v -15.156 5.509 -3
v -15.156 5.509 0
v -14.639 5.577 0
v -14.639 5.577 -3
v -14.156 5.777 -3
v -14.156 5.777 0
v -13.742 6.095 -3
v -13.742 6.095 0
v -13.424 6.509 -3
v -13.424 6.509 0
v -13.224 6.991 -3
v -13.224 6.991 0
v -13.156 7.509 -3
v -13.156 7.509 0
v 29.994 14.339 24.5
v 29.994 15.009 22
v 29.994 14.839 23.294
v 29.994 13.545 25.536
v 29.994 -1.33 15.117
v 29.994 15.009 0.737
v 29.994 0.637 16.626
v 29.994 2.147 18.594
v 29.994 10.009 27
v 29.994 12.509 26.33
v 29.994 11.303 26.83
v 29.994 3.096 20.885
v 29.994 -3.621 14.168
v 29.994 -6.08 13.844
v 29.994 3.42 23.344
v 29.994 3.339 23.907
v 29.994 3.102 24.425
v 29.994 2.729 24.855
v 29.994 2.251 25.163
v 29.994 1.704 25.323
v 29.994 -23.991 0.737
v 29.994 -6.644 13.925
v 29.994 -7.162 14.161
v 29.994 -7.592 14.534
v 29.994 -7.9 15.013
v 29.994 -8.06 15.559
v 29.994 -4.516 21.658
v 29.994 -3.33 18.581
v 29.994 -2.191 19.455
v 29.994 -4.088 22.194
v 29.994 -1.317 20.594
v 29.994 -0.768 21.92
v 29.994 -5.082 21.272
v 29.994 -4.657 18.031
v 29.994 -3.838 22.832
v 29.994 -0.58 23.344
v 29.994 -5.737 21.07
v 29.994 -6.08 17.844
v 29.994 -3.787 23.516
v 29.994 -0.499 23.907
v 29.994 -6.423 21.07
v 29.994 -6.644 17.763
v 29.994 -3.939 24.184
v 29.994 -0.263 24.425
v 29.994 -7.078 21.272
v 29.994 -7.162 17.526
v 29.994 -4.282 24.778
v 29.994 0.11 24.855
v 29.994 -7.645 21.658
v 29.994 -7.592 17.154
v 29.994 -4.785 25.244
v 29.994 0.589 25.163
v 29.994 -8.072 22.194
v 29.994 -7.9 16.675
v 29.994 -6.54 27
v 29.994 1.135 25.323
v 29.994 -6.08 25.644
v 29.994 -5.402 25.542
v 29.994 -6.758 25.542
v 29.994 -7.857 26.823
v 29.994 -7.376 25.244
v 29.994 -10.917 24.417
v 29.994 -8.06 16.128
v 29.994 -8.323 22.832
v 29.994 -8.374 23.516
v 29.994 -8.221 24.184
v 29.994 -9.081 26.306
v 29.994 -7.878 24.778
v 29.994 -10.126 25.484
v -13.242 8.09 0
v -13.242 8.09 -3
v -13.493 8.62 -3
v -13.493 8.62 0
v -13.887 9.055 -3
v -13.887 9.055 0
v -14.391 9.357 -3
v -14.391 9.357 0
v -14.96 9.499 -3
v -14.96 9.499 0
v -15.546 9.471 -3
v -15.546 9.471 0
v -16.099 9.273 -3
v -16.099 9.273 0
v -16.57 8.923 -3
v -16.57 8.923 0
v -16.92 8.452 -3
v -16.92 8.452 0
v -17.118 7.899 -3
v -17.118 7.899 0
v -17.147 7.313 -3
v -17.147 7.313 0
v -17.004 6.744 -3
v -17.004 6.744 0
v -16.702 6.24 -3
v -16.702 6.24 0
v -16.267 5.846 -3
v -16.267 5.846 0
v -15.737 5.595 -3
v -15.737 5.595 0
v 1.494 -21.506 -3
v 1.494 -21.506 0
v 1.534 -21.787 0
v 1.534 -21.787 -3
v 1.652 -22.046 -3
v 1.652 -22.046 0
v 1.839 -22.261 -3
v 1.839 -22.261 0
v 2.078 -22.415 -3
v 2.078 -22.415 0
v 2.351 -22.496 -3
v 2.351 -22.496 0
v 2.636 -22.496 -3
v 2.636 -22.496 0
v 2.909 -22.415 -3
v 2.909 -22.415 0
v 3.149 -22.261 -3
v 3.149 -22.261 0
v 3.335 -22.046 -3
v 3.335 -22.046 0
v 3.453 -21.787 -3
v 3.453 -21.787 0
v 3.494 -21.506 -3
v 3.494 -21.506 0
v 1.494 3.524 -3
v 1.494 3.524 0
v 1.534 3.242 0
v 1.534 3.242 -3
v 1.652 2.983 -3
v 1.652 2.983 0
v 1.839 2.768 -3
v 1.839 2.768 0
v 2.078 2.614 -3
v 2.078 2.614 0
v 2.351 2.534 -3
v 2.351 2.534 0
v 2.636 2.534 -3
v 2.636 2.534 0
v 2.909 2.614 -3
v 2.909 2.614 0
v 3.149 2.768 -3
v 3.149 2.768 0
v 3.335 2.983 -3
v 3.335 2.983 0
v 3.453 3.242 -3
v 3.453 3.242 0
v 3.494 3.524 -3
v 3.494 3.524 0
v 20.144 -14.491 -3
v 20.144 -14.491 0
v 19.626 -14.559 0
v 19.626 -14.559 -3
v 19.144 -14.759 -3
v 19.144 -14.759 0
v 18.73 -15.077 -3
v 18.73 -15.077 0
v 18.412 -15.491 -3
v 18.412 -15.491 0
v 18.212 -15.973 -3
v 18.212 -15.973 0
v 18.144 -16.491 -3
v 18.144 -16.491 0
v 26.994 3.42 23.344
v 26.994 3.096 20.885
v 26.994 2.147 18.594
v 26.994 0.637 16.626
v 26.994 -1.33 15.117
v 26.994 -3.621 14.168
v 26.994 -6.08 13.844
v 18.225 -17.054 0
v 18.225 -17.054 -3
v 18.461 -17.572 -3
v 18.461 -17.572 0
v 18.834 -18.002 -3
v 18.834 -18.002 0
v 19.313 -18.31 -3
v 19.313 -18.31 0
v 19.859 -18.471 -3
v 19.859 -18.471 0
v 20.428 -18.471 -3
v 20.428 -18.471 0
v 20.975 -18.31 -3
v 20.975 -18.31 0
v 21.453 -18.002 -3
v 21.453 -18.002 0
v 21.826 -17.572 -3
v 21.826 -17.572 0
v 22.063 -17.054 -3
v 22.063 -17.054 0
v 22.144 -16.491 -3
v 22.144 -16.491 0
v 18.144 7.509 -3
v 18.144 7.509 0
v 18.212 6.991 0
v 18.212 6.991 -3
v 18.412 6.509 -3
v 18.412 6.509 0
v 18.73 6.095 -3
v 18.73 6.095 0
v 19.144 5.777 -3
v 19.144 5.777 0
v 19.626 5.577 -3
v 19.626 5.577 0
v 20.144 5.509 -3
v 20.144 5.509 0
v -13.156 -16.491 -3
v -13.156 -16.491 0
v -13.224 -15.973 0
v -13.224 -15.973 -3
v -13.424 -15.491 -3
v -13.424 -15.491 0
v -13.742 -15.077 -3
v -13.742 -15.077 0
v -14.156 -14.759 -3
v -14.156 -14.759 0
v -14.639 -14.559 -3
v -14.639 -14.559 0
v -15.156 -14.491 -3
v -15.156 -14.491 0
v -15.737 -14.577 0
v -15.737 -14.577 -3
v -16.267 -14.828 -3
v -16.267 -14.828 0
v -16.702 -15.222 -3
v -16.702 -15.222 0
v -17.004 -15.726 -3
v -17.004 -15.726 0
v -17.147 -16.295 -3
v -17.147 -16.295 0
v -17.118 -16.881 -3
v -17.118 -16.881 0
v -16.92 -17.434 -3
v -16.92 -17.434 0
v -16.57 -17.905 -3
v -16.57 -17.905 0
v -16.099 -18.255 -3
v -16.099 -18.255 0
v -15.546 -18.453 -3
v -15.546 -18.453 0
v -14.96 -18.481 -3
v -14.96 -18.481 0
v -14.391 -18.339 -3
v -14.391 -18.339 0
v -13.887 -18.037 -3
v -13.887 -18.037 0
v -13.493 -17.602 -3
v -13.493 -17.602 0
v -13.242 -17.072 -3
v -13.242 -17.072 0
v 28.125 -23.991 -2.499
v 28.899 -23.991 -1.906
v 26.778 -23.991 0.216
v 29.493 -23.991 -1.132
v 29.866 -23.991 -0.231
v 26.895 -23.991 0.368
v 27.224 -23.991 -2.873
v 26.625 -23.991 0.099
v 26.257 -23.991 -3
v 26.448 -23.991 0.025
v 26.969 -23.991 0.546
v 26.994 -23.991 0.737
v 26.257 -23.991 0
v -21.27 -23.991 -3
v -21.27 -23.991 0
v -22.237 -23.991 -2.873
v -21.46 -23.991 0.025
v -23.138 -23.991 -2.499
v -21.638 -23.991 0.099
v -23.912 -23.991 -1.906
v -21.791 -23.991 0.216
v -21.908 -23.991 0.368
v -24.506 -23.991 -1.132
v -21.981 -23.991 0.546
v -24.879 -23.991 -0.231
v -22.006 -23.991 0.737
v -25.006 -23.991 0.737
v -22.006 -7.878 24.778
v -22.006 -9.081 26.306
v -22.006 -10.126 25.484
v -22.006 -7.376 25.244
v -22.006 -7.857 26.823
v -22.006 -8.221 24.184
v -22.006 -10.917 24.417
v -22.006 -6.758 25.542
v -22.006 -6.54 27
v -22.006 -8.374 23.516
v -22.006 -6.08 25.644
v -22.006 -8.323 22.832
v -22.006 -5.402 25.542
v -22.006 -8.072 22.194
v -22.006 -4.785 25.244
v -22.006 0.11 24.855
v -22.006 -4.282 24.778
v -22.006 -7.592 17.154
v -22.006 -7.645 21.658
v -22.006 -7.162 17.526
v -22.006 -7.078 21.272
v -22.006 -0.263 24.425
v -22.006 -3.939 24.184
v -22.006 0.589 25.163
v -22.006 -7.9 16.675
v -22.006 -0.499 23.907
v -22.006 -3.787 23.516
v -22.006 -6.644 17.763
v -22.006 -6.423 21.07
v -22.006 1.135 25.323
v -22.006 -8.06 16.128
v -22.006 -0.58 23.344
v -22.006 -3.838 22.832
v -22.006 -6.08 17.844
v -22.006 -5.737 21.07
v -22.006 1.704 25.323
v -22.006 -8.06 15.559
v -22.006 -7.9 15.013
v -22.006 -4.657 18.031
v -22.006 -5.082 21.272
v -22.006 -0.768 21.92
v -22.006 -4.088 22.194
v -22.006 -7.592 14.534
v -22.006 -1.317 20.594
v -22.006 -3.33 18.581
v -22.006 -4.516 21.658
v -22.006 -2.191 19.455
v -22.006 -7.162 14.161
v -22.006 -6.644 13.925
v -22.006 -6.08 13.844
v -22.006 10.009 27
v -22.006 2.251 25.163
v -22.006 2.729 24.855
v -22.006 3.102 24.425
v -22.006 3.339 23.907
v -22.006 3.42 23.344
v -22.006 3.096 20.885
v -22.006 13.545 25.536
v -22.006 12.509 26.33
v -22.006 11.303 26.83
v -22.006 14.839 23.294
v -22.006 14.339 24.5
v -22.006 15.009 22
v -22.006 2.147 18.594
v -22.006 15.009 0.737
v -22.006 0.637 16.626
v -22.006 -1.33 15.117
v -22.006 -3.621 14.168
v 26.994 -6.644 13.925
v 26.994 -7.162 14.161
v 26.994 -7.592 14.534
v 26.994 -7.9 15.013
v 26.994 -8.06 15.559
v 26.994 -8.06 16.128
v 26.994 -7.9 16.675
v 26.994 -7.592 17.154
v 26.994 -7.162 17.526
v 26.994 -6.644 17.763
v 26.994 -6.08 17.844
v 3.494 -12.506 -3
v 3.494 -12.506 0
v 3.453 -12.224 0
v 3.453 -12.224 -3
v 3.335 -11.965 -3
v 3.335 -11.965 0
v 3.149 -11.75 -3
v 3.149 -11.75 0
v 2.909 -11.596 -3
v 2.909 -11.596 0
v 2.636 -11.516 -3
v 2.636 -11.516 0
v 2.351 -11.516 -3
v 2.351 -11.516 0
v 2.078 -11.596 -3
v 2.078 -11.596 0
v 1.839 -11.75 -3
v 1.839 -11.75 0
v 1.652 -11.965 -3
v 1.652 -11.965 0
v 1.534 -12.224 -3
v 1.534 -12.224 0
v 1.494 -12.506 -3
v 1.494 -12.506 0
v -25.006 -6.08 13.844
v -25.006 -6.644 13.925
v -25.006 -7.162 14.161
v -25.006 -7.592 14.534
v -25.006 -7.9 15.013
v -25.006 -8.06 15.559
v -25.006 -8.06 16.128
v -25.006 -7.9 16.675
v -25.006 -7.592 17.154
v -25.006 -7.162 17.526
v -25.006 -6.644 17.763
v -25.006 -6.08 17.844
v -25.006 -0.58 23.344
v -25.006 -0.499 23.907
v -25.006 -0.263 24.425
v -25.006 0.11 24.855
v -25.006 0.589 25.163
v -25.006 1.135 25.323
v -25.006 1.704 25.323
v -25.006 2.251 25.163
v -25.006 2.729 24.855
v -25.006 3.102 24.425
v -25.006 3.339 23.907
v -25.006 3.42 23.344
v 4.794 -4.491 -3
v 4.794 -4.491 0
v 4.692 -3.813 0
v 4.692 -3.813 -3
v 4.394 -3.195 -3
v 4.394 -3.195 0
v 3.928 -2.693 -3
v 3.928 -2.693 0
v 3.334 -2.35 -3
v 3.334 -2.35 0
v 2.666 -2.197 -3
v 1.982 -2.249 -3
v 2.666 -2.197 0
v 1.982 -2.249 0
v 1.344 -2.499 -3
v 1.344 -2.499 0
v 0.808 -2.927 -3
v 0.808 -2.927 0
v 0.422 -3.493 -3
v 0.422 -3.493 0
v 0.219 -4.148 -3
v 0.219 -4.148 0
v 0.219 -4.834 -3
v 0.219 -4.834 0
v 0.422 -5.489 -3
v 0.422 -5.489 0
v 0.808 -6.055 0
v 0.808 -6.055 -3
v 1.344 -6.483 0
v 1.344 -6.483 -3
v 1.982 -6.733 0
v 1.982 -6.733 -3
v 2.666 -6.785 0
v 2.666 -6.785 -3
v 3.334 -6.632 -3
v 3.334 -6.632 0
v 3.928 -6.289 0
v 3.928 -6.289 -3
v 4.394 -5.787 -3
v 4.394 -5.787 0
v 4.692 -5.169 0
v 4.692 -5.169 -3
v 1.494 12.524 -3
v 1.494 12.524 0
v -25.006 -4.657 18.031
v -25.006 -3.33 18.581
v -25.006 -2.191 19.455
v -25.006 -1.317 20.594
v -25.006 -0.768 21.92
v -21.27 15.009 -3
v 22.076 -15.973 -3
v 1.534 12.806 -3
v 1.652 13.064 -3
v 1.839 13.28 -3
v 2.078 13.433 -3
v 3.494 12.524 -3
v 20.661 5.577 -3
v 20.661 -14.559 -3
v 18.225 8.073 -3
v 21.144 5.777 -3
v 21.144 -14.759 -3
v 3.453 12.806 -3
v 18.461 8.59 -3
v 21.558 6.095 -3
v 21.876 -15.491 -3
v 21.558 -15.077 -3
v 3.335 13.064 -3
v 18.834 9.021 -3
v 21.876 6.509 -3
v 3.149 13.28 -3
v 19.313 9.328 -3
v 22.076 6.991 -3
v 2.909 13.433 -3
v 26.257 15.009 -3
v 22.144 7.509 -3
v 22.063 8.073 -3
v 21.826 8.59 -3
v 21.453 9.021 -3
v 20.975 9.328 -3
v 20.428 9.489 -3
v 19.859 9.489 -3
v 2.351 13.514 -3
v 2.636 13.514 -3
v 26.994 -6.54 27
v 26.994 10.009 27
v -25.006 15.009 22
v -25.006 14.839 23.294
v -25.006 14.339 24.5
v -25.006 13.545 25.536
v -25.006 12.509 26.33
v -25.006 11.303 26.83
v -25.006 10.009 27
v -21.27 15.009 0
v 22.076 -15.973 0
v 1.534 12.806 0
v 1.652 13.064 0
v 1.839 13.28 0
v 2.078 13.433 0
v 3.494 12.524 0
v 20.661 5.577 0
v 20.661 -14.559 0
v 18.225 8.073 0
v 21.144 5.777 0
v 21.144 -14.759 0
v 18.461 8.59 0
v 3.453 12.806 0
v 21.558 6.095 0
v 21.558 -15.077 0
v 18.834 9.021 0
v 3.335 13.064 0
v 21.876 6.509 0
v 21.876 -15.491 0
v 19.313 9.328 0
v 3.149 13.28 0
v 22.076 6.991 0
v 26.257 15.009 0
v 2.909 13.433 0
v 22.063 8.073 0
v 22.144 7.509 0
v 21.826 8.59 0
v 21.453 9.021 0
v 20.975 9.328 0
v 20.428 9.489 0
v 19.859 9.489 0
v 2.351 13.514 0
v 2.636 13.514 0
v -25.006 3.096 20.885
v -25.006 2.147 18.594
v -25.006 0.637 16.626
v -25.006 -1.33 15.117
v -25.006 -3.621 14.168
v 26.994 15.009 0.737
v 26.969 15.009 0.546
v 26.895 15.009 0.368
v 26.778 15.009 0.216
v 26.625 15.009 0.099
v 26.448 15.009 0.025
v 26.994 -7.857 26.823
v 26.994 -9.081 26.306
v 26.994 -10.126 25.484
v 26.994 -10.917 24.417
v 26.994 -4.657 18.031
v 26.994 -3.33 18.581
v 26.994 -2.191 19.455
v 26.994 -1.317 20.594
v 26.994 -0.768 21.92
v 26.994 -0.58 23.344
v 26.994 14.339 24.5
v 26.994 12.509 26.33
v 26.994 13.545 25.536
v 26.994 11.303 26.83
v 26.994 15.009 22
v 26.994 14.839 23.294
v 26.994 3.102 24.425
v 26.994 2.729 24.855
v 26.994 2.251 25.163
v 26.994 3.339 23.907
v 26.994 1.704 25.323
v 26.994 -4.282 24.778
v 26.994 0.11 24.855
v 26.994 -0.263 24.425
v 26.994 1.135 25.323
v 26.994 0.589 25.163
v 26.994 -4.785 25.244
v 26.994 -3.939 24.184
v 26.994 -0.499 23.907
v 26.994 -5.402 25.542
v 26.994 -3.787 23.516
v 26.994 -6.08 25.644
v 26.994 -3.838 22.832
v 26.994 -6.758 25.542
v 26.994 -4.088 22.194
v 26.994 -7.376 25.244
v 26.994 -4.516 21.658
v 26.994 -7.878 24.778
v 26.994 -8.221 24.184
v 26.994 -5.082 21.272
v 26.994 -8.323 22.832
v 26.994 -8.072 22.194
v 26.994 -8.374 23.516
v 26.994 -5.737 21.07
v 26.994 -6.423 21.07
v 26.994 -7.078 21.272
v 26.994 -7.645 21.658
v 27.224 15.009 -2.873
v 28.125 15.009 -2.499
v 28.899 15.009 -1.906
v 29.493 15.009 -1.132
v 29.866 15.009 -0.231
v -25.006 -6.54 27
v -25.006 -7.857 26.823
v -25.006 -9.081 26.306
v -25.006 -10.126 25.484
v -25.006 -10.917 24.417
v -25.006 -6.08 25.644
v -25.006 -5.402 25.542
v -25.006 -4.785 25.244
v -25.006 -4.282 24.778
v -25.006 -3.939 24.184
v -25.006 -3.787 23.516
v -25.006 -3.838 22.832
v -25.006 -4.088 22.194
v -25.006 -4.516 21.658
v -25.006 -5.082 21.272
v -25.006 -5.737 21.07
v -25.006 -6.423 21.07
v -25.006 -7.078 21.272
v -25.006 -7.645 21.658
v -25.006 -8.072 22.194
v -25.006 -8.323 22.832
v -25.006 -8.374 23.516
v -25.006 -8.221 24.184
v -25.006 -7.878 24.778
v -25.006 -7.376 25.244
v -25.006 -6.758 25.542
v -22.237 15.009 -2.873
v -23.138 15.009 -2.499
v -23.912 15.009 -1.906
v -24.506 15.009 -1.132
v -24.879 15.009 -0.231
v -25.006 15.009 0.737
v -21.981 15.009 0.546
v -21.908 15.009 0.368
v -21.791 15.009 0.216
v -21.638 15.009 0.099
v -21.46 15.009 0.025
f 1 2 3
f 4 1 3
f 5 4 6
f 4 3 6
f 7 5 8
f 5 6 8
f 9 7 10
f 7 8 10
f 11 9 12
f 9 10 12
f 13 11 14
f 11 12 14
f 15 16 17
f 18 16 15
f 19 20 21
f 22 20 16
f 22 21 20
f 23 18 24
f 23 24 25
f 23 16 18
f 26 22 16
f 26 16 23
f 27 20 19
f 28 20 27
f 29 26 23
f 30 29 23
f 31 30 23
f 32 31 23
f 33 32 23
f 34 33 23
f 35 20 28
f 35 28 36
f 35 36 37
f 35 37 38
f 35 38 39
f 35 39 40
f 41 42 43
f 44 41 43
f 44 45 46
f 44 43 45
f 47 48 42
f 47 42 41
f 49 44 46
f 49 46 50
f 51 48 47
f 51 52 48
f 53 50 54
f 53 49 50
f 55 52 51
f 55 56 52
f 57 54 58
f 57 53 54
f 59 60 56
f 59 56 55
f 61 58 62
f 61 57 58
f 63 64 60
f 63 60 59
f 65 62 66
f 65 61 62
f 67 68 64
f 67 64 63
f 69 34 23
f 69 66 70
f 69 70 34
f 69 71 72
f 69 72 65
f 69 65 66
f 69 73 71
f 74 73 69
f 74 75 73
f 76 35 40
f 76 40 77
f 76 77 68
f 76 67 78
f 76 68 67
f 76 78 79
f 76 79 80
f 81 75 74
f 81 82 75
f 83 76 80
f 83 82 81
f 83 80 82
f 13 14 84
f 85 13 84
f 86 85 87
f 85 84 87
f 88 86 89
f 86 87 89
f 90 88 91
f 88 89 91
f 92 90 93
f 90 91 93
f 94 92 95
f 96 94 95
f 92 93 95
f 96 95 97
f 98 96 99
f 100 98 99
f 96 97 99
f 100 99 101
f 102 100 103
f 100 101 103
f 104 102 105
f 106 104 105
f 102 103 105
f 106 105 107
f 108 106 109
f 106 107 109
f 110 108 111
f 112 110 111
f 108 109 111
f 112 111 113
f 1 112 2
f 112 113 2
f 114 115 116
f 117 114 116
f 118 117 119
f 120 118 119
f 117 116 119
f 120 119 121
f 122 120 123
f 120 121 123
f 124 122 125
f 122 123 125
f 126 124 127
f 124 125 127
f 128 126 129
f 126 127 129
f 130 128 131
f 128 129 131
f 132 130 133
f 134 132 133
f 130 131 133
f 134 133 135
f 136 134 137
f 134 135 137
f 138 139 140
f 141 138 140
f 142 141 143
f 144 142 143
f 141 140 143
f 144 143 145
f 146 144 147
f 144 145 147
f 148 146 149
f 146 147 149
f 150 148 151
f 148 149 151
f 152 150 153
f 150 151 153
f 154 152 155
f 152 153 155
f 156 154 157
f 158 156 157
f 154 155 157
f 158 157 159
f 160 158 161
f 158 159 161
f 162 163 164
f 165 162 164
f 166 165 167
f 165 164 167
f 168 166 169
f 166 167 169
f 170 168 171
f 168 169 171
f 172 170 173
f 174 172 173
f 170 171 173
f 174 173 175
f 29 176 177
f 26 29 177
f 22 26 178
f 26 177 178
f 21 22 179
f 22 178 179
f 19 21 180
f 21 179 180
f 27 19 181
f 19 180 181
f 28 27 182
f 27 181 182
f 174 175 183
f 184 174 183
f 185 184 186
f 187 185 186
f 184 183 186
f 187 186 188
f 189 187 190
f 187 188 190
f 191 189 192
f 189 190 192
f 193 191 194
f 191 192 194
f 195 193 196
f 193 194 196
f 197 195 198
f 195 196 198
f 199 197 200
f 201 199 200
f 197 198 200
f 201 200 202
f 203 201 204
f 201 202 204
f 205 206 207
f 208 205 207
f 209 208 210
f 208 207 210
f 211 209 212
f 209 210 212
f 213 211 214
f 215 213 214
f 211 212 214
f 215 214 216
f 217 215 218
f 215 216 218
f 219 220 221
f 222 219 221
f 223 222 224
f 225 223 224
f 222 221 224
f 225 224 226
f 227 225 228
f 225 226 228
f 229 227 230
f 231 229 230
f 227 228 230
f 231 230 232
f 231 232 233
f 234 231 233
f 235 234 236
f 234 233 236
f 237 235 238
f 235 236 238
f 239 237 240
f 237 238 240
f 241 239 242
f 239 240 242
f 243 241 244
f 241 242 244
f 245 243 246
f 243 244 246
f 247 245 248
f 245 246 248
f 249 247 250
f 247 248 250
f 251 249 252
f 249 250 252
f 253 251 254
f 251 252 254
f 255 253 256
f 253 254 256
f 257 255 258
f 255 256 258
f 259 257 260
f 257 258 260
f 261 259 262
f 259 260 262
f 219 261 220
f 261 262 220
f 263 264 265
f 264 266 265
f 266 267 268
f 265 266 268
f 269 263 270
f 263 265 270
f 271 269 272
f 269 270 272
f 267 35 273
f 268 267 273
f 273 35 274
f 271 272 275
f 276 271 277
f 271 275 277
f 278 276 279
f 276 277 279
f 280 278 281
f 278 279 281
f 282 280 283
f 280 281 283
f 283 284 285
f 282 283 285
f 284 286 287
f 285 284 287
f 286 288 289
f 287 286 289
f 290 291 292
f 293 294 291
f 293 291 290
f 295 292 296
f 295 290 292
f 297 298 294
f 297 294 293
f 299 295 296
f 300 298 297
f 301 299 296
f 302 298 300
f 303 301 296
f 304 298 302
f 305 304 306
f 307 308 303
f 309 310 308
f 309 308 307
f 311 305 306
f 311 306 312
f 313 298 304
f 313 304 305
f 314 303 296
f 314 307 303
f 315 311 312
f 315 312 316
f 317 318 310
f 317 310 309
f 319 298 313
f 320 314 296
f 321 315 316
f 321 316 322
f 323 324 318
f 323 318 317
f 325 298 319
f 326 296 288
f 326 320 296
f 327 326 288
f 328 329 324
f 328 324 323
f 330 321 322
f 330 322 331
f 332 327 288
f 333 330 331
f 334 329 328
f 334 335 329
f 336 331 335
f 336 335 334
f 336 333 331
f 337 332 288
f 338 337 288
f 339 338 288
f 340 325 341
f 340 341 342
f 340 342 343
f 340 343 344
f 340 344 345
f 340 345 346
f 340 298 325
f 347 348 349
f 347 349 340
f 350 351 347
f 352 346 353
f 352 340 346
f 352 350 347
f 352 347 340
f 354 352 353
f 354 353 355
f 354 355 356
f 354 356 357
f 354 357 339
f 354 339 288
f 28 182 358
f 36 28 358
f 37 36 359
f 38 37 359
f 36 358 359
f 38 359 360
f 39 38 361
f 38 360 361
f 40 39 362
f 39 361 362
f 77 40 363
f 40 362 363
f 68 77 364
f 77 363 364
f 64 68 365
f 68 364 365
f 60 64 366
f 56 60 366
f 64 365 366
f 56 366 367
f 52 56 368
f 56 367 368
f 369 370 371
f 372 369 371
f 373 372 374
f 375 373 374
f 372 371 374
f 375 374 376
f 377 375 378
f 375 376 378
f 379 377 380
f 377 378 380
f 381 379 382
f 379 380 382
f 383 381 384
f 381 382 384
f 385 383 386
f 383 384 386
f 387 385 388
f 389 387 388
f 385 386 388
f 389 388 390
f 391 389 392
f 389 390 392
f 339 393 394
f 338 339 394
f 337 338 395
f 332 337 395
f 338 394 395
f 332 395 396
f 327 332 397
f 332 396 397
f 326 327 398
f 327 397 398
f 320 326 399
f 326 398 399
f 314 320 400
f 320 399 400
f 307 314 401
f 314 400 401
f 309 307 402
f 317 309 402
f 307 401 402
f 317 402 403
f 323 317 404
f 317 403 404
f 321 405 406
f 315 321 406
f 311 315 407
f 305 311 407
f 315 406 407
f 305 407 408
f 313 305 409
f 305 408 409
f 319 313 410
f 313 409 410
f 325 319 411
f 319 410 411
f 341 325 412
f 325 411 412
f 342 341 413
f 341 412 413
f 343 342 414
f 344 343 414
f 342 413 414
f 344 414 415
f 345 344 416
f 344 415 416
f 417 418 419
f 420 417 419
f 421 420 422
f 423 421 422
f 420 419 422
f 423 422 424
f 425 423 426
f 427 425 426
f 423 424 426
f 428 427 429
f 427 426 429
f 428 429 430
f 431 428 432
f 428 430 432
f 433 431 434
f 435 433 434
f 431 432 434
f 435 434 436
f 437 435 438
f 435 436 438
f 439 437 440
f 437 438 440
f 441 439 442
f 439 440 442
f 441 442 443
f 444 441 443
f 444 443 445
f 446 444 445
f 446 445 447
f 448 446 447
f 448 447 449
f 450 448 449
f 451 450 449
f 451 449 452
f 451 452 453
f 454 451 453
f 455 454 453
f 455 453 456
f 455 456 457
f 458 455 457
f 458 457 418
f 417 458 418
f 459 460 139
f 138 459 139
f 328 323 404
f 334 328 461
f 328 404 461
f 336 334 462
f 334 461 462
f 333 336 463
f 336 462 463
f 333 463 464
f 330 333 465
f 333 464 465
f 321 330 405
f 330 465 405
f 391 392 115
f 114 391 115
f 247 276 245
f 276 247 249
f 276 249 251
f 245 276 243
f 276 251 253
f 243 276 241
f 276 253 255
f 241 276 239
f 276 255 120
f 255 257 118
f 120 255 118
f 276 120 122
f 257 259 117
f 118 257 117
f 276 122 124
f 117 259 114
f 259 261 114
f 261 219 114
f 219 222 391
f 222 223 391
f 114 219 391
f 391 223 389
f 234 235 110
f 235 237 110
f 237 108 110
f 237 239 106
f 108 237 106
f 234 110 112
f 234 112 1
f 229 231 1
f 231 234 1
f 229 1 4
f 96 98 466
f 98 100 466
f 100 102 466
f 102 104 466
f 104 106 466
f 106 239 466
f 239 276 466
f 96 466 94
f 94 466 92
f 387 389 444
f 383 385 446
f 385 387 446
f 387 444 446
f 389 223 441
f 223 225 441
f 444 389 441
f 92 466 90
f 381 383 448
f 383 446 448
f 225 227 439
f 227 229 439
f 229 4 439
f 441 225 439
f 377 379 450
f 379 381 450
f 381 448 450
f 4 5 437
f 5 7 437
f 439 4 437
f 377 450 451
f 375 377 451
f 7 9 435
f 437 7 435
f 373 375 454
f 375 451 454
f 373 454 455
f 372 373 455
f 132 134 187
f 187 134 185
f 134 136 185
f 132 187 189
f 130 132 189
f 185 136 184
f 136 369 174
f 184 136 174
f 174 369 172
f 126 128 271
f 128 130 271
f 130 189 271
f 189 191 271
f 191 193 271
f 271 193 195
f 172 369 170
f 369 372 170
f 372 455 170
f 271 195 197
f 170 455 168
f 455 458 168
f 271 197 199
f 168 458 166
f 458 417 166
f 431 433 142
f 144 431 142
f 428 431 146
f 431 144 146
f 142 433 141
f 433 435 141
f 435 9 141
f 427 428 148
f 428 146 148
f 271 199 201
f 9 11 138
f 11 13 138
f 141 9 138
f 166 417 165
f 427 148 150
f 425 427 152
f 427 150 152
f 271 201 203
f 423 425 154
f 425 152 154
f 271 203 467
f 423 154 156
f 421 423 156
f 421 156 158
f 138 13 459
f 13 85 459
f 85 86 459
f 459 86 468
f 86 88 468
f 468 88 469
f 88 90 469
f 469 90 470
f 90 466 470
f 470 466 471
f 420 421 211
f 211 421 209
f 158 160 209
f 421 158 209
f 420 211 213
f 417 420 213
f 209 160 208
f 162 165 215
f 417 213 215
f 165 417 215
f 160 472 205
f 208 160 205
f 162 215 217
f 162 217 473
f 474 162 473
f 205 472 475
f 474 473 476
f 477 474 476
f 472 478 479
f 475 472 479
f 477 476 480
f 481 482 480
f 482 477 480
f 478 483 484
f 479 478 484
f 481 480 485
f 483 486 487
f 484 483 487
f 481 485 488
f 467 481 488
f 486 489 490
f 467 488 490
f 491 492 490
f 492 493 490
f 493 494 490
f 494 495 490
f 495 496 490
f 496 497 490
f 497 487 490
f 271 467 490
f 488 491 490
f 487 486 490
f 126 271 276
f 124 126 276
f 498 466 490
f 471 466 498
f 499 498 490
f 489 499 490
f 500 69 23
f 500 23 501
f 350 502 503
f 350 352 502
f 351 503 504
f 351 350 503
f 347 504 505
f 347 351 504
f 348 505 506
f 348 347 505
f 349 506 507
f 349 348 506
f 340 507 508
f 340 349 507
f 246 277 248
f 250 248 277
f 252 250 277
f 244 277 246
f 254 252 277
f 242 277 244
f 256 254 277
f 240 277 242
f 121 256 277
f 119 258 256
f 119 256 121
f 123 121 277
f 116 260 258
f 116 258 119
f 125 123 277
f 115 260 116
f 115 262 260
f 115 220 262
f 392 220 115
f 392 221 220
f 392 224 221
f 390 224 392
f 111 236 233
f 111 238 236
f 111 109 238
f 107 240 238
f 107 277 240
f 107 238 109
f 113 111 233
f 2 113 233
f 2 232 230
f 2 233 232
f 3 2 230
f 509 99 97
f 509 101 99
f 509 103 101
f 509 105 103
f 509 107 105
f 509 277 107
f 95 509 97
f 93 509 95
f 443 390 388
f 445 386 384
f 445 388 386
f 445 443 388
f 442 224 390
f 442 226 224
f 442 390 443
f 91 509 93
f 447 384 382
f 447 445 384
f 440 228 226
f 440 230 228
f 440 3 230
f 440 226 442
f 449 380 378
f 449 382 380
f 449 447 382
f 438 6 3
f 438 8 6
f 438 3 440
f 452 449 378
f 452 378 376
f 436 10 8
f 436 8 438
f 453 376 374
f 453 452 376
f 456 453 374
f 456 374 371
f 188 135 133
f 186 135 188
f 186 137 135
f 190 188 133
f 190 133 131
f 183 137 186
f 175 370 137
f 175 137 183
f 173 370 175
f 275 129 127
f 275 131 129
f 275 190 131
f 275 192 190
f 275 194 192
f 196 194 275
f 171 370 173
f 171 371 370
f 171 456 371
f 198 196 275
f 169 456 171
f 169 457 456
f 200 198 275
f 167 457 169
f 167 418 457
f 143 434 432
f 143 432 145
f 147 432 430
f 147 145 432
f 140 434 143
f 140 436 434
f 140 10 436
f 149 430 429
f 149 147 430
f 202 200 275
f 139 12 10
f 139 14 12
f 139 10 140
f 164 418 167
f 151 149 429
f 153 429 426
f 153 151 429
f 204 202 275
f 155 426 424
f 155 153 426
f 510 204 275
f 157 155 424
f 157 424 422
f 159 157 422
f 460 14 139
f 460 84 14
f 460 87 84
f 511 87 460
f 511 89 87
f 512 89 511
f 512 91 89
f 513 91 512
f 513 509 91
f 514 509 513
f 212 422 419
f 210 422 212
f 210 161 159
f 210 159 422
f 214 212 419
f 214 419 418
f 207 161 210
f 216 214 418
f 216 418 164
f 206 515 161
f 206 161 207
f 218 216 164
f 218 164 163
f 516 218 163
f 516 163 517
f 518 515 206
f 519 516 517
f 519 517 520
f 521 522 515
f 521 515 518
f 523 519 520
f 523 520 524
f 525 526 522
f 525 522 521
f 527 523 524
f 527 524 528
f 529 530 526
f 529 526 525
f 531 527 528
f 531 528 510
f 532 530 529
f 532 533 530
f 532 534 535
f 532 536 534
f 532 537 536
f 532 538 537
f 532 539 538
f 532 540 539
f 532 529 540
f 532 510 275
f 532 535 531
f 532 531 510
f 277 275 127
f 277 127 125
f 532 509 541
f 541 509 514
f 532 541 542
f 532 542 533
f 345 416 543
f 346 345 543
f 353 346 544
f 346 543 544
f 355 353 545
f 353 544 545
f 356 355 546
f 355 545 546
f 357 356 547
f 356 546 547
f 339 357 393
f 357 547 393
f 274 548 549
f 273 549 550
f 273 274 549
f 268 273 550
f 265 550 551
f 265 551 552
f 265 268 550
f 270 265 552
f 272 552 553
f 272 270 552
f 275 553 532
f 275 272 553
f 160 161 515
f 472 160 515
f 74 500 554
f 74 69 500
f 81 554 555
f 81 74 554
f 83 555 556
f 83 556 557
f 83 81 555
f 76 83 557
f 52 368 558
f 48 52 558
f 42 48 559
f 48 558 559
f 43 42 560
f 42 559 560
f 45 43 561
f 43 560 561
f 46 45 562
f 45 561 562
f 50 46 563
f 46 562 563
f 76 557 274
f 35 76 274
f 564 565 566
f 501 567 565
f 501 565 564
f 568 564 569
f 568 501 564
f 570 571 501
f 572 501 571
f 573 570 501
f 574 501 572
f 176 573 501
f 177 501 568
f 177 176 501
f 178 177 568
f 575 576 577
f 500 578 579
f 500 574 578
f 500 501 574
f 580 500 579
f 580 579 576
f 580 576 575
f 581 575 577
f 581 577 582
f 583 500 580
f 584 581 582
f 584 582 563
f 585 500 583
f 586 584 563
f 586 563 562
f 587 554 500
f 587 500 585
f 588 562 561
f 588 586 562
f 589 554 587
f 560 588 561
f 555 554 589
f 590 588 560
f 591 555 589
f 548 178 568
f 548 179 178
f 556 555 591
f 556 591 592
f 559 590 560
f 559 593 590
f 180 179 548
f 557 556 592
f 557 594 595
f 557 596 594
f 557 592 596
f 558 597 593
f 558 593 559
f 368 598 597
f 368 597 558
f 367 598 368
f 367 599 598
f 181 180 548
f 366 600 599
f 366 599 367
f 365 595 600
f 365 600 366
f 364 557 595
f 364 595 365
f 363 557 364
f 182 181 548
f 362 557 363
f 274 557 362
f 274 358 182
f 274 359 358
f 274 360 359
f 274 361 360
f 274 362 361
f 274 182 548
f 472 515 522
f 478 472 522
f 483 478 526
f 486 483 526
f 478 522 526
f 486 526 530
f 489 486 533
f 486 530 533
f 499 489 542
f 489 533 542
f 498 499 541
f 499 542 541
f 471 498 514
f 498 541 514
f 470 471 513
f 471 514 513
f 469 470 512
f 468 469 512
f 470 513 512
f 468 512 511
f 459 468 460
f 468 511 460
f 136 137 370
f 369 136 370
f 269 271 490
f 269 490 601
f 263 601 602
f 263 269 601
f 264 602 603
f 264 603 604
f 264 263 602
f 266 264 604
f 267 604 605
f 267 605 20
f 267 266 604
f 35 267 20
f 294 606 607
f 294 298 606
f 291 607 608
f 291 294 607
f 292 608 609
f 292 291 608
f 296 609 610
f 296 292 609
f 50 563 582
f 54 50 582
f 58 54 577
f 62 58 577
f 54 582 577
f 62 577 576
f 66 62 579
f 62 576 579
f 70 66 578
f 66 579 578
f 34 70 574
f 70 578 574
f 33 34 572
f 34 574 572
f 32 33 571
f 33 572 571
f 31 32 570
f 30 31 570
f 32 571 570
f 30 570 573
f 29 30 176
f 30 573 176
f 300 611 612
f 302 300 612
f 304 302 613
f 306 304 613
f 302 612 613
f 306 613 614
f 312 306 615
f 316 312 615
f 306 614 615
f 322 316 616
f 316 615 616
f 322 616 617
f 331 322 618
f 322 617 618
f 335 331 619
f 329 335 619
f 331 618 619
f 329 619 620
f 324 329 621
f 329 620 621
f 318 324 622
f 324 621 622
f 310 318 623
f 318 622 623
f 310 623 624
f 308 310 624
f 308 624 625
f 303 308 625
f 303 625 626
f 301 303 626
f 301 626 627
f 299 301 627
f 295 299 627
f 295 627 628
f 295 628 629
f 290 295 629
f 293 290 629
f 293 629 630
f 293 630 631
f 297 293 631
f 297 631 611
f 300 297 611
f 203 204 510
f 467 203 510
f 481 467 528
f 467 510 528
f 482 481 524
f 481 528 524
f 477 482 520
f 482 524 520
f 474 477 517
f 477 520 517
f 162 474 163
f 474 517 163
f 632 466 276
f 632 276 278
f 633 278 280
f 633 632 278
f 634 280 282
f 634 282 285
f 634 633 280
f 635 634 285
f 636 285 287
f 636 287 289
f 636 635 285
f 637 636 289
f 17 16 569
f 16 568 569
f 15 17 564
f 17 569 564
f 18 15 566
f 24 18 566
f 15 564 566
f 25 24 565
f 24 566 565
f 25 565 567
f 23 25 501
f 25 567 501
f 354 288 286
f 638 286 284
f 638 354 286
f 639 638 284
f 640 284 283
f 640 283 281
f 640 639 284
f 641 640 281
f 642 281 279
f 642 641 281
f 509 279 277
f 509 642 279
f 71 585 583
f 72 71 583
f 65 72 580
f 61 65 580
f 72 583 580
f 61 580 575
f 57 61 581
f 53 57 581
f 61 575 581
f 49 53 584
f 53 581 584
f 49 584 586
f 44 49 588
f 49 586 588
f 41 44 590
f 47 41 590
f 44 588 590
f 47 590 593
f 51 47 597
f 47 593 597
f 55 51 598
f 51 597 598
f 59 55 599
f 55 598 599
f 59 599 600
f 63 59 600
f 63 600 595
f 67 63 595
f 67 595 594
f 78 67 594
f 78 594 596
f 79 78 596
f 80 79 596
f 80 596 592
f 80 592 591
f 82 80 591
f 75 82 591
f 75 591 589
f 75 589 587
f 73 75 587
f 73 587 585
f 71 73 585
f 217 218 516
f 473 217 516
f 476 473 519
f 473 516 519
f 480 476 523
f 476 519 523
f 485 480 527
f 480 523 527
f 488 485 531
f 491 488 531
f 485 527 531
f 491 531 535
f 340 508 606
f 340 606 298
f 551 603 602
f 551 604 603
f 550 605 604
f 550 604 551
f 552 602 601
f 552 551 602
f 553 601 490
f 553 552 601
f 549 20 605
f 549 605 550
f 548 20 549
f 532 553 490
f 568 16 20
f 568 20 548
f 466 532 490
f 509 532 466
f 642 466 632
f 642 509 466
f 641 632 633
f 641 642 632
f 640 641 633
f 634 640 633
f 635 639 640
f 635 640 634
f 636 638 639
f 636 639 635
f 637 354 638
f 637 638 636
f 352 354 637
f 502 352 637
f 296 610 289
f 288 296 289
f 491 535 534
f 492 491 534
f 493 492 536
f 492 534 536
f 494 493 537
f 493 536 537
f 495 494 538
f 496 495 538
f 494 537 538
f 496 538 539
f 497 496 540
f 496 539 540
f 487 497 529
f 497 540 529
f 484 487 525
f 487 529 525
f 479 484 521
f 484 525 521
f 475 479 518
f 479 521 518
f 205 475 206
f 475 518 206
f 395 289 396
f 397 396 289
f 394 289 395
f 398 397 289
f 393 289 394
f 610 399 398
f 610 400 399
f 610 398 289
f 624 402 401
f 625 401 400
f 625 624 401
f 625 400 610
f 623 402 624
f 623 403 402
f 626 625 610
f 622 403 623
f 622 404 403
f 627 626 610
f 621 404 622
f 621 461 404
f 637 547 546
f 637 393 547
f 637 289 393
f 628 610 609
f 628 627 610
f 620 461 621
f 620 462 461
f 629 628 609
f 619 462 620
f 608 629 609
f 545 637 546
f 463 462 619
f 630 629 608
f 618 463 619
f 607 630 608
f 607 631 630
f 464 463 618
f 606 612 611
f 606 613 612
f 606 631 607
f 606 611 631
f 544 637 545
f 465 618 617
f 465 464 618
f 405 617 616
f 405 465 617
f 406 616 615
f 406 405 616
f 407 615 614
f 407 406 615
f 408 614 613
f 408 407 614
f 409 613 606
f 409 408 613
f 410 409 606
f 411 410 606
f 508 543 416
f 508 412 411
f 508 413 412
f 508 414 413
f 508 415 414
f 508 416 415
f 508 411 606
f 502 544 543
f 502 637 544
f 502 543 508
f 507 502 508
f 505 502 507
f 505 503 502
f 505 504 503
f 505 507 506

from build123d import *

# Parameters (mm, degrees)
ESBO_O1_W                        = 49
ESBO_O1_H                        = 39
FLANGE_BASE1_DEPTH               = 3
ESBO_O6_R                        = 2.3
CORTE_EXTRUS_O1_DEPTH            = 10
ARESTA_FLANGE1_STRIP_W           = 13.4732
ARESTA_FLANGE1_STRIP_H           = 3
ARESTA_FLANGE1_STRIP_CUT_DEPTH   = 39
ARESTA_FLANGE1_STRIP_2_W         = 13.4732
ARESTA_FLANGE1_STRIP_2_H         = 3
ARESTA_FLANGE1_STRIP_CUT_2_DEPTH = 39
ARESTA_FLANGE1_DEPTH             = 39
ARESTA_FLANGE1_BEND_DEPTH        = 39
ESBO_O13_R                       = 2.3
CORTE_EXTRUS_O2_DEPTH            = 70
FILETE1_R                        = 5


# Sheet-metal steps are written as plain solids
with BuildPart() as part:
    # Esboço1 → Flange-base1 (new body)
    with BuildSketch(Plane.XY):
        with Locations((2.493735783, -4.490936556)):
            Rectangle(ESBO_O1_W, ESBO_O1_H)
    extrude(amount=-FLANGE_BASE1_DEPTH)

    # Esboço6 → Corte-extrusão1 (cut)
    with BuildSketch(Plane.XY):
        with BuildLine():
            Line((-15.156264217, 5.509063444), (-15.156264217, 7.509063444))
            Line((-15.156264217, 7.509063444), (-13.156264217, 7.509063444))
            ThreePointArc((-13.156264217, 7.509063444), (-16.570477779, 8.923277006), (-15.156264217, 5.509063444))
        make_face()
        with BuildLine():
            Line((-13.156264217, 7.509063444), (-15.156264217, 7.509063444))
            Line((-15.156264217, 7.509063444), (-15.156264217, 5.509063444))
            ThreePointArc((-15.156264217, 5.509063444), (-13.742050654, 6.094849882), (-13.156264217, 7.509063444))
        make_face()
        with BuildLine():
            ThreePointArc((-13.156264217, -16.490936556), (-13.742050654, -15.076722994), (-15.156264217, -14.490936556))
            Line((-15.156264217, -14.490936556), (-15.156264217, -16.490936556))
            Line((-15.156264217, -16.490936556), (-13.156264217, -16.490936556))
        make_face()
        with BuildLine():
            Line((-15.156264217, -16.490936556), (-15.156264217, -14.490936556))
            ThreePointArc((-15.156264217, -14.490936556), (-16.570477779, -17.905150118), (-13.156264217, -16.490936556))
            Line((-13.156264217, -16.490936556), (-15.156264217, -16.490936556))
        make_face()
        with Locations((2.493735783, -4.490936556)):
            Circle(ESBO_O6_R)
        with BuildLine():
            Line((3.493735783, 7.509063444), (1.493735783, 7.509063444))
            Line((1.493735783, 7.509063444), (1.493735783, 3.523823043))
            ThreePointArc((1.493735783, 3.523823043), (2.493735783, 2.523823043), (3.493735783, 3.523823043))
            Line((3.493735783, 3.523823043), (3.493735783, 7.509063444))
        make_face()
        with BuildLine():
            Line((1.493735783, 12.523823043), (1.493735783, 7.509063444))
            Line((1.493735783, 7.509063444), (3.493735783, 7.509063444))
            Line((3.493735783, 7.509063444), (3.493735783, 12.523823043))
            ThreePointArc((3.493735783, 12.523823043), (2.493735783, 13.523823043), (1.493735783, 12.523823043))
        make_face()
        with BuildLine():
            Line((1.493735783, -12.505696155), (1.493735783, -16.490936556))
            Line((1.493735783, -16.490936556), (3.493735783, -16.490936556))
            Line((3.493735783, -16.490936556), (3.493735783, -12.505696155))
            ThreePointArc((3.493735783, -12.505696155), (2.493735783, -11.505696155), (1.493735783, -12.505696155))
        make_face()
        with BuildLine():
            Line((3.493735783, -16.490936556), (1.493735783, -16.490936556))
            Line((1.493735783, -16.490936556), (1.493735783, -21.505696155))
            ThreePointArc((1.493735783, -21.505696155), (2.493735783, -22.505696155), (3.493735783, -21.505696155))
            Line((3.493735783, -21.505696155), (3.493735783, -16.490936556))
        make_face()
        with BuildLine():
            ThreePointArc((22.143735783, -16.490936556), (21.557949346, -15.076722994), (20.143735783, -14.490936556))
            Line((20.143735783, -14.490936556), (20.143735783, -16.490936556))
            Line((20.143735783, -16.490936556), (18.143735783, -16.490936556))
            ThreePointArc((18.143735783, -16.490936556), (20.143735783, -18.490936556), (22.143735783, -16.490936556))
        make_face()
        with BuildLine():
            Line((20.143735783, -16.490936556), (20.143735783, -14.490936556))
            ThreePointArc((20.143735783, -14.490936556), (18.729522221, -15.076722994), (18.143735783, -16.490936556))
            Line((18.143735783, -16.490936556), (20.143735783, -16.490936556))
        make_face()
        with BuildLine():
            ThreePointArc((22.143735783, 7.509063444), (20.143735783, 9.509063444), (18.143735783, 7.509063444))
            Line((18.143735783, 7.509063444), (20.143735783, 7.509063444))
            Line((20.143735783, 7.509063444), (20.143735783, 5.509063444))
            ThreePointArc((20.143735783, 5.509063444), (21.557949346, 6.094849882), (22.143735783, 7.509063444))
        make_face()
        with BuildLine():
            Line((20.143735783, 7.509063444), (18.143735783, 7.509063444))
            ThreePointArc((18.143735783, 7.509063444), (18.729522221, 6.094849882), (20.143735783, 5.509063444))
            Line((20.143735783, 5.509063444), (20.143735783, 7.509063444))
        make_face()
    extrude(amount=-CORTE_EXTRUS_O1_DEPTH, mode=Mode.SUBTRACT)

    # Aresta-Flange1 strip (across the edge) → Aresta-Flange1 strip cut (cut)
    with BuildSketch(Plane(origin=(26.993735783, -23.990936556, 0), x_dir=(-1, 0, 0), z_dir=(0, 1, 0))):
        with Locations((-6, -1.5)):
            Rectangle(ARESTA_FLANGE1_STRIP_W, ARESTA_FLANGE1_STRIP_H)
    extrude(amount=ARESTA_FLANGE1_STRIP_CUT_DEPTH, mode=Mode.SUBTRACT)

    # Aresta-Flange1 strip 2 (across the edge) → Aresta-Flange1 strip cut 2 (cut)
    with BuildSketch(Plane(origin=(-22.006264217, 15.009063444, 0), x_dir=(1, 0, 0), z_dir=(0, -1, 0))):
        with Locations((-6, -1.5)):
            Rectangle(ARESTA_FLANGE1_STRIP_2_W, ARESTA_FLANGE1_STRIP_2_H)
    extrude(amount=ARESTA_FLANGE1_STRIP_CUT_2_DEPTH, mode=Mode.SUBTRACT)

    # Aresta-Flange1 section (across the edge) → Aresta-Flange1 (add)
    with BuildSketch(Plane(origin=(26.993735783, -23.990936556, 0), x_dir=(-1, 0, 0), z_dir=(0, 1, 0))):
        with BuildLine():
            Line((-3, 0.7366), (-3, 27))
            Line((-3, 27), (0, 27))
            Line((0, 27), (0, 0.7366))
            ThreePointArc((0, 0.7366), (0.215745145, 0.215745145), (0.7366, 0))
            Line((0.7366, 0), (0.7366, -3))
            ThreePointArc((0.7366, -3), (-1.905575199, -1.905575199), (-3, 0.7366))
        make_face()
    extrude(amount=ARESTA_FLANGE1_DEPTH)

    # Aresta-Flange1 section 2 (across the edge) → Aresta-Flange1 bend (add)
    with BuildSketch(Plane(origin=(-22.006264217, 15.009063444, 0), x_dir=(1, 0, 0), z_dir=(0, -1, 0))):
        with BuildLine():
            Line((-3, 0.7366), (-3, 27))
            Line((-3, 27), (0, 27))
            Line((0, 27), (0, 0.7366))
            ThreePointArc((0, 0.7366), (0.215745145, 0.215745145), (0.7366, 0))
            Line((0.7366, 0), (0.7366, -3))
            ThreePointArc((0.7366, -3), (-1.905575199, -1.905575199), (-3, 0.7366))
        make_face()
    extrude(amount=ARESTA_FLANGE1_BEND_DEPTH)

    # Esboço13 → Corte-extrusão2 (cut)
    with BuildSketch(Plane.ZY.offset(25.006264217)):
        with Locations((23.343855314, -6.08027591)):
            Circle(ESBO_O13_R)
        Polygon((0.7366, -23.990936556), (27, -23.990936556), (27, -9.490936556), align=None)
        with BuildLine():
            ThreePointArc((23.343855314, 3.41972409), (16.626340893, 0.637238511), (13.843855314, -6.08027591))
            ThreePointArc((13.843855314, -6.08027591), (15.843855314, -8.08027591), (17.843855314, -6.08027591))
            ThreePointArc((17.843855314, -6.08027591), (19.454768018, -2.191188614), (23.343855314, -0.58027591))
            ThreePointArc((23.343855314, -0.58027591), (25.343855314, 1.41972409), (23.343855314, 3.41972409))
        make_face()
    extrude(amount=-CORTE_EXTRUS_O2_DEPTH, mode=Mode.SUBTRACT)

    # Filete1
    filete1_edges = [part.edges().sort_by_distance(p)[0] for p in [
        (28.493735783, 15.009063444, 27),
        (-23.506264217, 15.009063444, 27),
        (-23.506264217, -9.490936556, 27),
        (28.493735783, -9.490936556, 27),
    ]]
    fillet(filete1_edges, radius=FILETE1_R)


solid = part.part
